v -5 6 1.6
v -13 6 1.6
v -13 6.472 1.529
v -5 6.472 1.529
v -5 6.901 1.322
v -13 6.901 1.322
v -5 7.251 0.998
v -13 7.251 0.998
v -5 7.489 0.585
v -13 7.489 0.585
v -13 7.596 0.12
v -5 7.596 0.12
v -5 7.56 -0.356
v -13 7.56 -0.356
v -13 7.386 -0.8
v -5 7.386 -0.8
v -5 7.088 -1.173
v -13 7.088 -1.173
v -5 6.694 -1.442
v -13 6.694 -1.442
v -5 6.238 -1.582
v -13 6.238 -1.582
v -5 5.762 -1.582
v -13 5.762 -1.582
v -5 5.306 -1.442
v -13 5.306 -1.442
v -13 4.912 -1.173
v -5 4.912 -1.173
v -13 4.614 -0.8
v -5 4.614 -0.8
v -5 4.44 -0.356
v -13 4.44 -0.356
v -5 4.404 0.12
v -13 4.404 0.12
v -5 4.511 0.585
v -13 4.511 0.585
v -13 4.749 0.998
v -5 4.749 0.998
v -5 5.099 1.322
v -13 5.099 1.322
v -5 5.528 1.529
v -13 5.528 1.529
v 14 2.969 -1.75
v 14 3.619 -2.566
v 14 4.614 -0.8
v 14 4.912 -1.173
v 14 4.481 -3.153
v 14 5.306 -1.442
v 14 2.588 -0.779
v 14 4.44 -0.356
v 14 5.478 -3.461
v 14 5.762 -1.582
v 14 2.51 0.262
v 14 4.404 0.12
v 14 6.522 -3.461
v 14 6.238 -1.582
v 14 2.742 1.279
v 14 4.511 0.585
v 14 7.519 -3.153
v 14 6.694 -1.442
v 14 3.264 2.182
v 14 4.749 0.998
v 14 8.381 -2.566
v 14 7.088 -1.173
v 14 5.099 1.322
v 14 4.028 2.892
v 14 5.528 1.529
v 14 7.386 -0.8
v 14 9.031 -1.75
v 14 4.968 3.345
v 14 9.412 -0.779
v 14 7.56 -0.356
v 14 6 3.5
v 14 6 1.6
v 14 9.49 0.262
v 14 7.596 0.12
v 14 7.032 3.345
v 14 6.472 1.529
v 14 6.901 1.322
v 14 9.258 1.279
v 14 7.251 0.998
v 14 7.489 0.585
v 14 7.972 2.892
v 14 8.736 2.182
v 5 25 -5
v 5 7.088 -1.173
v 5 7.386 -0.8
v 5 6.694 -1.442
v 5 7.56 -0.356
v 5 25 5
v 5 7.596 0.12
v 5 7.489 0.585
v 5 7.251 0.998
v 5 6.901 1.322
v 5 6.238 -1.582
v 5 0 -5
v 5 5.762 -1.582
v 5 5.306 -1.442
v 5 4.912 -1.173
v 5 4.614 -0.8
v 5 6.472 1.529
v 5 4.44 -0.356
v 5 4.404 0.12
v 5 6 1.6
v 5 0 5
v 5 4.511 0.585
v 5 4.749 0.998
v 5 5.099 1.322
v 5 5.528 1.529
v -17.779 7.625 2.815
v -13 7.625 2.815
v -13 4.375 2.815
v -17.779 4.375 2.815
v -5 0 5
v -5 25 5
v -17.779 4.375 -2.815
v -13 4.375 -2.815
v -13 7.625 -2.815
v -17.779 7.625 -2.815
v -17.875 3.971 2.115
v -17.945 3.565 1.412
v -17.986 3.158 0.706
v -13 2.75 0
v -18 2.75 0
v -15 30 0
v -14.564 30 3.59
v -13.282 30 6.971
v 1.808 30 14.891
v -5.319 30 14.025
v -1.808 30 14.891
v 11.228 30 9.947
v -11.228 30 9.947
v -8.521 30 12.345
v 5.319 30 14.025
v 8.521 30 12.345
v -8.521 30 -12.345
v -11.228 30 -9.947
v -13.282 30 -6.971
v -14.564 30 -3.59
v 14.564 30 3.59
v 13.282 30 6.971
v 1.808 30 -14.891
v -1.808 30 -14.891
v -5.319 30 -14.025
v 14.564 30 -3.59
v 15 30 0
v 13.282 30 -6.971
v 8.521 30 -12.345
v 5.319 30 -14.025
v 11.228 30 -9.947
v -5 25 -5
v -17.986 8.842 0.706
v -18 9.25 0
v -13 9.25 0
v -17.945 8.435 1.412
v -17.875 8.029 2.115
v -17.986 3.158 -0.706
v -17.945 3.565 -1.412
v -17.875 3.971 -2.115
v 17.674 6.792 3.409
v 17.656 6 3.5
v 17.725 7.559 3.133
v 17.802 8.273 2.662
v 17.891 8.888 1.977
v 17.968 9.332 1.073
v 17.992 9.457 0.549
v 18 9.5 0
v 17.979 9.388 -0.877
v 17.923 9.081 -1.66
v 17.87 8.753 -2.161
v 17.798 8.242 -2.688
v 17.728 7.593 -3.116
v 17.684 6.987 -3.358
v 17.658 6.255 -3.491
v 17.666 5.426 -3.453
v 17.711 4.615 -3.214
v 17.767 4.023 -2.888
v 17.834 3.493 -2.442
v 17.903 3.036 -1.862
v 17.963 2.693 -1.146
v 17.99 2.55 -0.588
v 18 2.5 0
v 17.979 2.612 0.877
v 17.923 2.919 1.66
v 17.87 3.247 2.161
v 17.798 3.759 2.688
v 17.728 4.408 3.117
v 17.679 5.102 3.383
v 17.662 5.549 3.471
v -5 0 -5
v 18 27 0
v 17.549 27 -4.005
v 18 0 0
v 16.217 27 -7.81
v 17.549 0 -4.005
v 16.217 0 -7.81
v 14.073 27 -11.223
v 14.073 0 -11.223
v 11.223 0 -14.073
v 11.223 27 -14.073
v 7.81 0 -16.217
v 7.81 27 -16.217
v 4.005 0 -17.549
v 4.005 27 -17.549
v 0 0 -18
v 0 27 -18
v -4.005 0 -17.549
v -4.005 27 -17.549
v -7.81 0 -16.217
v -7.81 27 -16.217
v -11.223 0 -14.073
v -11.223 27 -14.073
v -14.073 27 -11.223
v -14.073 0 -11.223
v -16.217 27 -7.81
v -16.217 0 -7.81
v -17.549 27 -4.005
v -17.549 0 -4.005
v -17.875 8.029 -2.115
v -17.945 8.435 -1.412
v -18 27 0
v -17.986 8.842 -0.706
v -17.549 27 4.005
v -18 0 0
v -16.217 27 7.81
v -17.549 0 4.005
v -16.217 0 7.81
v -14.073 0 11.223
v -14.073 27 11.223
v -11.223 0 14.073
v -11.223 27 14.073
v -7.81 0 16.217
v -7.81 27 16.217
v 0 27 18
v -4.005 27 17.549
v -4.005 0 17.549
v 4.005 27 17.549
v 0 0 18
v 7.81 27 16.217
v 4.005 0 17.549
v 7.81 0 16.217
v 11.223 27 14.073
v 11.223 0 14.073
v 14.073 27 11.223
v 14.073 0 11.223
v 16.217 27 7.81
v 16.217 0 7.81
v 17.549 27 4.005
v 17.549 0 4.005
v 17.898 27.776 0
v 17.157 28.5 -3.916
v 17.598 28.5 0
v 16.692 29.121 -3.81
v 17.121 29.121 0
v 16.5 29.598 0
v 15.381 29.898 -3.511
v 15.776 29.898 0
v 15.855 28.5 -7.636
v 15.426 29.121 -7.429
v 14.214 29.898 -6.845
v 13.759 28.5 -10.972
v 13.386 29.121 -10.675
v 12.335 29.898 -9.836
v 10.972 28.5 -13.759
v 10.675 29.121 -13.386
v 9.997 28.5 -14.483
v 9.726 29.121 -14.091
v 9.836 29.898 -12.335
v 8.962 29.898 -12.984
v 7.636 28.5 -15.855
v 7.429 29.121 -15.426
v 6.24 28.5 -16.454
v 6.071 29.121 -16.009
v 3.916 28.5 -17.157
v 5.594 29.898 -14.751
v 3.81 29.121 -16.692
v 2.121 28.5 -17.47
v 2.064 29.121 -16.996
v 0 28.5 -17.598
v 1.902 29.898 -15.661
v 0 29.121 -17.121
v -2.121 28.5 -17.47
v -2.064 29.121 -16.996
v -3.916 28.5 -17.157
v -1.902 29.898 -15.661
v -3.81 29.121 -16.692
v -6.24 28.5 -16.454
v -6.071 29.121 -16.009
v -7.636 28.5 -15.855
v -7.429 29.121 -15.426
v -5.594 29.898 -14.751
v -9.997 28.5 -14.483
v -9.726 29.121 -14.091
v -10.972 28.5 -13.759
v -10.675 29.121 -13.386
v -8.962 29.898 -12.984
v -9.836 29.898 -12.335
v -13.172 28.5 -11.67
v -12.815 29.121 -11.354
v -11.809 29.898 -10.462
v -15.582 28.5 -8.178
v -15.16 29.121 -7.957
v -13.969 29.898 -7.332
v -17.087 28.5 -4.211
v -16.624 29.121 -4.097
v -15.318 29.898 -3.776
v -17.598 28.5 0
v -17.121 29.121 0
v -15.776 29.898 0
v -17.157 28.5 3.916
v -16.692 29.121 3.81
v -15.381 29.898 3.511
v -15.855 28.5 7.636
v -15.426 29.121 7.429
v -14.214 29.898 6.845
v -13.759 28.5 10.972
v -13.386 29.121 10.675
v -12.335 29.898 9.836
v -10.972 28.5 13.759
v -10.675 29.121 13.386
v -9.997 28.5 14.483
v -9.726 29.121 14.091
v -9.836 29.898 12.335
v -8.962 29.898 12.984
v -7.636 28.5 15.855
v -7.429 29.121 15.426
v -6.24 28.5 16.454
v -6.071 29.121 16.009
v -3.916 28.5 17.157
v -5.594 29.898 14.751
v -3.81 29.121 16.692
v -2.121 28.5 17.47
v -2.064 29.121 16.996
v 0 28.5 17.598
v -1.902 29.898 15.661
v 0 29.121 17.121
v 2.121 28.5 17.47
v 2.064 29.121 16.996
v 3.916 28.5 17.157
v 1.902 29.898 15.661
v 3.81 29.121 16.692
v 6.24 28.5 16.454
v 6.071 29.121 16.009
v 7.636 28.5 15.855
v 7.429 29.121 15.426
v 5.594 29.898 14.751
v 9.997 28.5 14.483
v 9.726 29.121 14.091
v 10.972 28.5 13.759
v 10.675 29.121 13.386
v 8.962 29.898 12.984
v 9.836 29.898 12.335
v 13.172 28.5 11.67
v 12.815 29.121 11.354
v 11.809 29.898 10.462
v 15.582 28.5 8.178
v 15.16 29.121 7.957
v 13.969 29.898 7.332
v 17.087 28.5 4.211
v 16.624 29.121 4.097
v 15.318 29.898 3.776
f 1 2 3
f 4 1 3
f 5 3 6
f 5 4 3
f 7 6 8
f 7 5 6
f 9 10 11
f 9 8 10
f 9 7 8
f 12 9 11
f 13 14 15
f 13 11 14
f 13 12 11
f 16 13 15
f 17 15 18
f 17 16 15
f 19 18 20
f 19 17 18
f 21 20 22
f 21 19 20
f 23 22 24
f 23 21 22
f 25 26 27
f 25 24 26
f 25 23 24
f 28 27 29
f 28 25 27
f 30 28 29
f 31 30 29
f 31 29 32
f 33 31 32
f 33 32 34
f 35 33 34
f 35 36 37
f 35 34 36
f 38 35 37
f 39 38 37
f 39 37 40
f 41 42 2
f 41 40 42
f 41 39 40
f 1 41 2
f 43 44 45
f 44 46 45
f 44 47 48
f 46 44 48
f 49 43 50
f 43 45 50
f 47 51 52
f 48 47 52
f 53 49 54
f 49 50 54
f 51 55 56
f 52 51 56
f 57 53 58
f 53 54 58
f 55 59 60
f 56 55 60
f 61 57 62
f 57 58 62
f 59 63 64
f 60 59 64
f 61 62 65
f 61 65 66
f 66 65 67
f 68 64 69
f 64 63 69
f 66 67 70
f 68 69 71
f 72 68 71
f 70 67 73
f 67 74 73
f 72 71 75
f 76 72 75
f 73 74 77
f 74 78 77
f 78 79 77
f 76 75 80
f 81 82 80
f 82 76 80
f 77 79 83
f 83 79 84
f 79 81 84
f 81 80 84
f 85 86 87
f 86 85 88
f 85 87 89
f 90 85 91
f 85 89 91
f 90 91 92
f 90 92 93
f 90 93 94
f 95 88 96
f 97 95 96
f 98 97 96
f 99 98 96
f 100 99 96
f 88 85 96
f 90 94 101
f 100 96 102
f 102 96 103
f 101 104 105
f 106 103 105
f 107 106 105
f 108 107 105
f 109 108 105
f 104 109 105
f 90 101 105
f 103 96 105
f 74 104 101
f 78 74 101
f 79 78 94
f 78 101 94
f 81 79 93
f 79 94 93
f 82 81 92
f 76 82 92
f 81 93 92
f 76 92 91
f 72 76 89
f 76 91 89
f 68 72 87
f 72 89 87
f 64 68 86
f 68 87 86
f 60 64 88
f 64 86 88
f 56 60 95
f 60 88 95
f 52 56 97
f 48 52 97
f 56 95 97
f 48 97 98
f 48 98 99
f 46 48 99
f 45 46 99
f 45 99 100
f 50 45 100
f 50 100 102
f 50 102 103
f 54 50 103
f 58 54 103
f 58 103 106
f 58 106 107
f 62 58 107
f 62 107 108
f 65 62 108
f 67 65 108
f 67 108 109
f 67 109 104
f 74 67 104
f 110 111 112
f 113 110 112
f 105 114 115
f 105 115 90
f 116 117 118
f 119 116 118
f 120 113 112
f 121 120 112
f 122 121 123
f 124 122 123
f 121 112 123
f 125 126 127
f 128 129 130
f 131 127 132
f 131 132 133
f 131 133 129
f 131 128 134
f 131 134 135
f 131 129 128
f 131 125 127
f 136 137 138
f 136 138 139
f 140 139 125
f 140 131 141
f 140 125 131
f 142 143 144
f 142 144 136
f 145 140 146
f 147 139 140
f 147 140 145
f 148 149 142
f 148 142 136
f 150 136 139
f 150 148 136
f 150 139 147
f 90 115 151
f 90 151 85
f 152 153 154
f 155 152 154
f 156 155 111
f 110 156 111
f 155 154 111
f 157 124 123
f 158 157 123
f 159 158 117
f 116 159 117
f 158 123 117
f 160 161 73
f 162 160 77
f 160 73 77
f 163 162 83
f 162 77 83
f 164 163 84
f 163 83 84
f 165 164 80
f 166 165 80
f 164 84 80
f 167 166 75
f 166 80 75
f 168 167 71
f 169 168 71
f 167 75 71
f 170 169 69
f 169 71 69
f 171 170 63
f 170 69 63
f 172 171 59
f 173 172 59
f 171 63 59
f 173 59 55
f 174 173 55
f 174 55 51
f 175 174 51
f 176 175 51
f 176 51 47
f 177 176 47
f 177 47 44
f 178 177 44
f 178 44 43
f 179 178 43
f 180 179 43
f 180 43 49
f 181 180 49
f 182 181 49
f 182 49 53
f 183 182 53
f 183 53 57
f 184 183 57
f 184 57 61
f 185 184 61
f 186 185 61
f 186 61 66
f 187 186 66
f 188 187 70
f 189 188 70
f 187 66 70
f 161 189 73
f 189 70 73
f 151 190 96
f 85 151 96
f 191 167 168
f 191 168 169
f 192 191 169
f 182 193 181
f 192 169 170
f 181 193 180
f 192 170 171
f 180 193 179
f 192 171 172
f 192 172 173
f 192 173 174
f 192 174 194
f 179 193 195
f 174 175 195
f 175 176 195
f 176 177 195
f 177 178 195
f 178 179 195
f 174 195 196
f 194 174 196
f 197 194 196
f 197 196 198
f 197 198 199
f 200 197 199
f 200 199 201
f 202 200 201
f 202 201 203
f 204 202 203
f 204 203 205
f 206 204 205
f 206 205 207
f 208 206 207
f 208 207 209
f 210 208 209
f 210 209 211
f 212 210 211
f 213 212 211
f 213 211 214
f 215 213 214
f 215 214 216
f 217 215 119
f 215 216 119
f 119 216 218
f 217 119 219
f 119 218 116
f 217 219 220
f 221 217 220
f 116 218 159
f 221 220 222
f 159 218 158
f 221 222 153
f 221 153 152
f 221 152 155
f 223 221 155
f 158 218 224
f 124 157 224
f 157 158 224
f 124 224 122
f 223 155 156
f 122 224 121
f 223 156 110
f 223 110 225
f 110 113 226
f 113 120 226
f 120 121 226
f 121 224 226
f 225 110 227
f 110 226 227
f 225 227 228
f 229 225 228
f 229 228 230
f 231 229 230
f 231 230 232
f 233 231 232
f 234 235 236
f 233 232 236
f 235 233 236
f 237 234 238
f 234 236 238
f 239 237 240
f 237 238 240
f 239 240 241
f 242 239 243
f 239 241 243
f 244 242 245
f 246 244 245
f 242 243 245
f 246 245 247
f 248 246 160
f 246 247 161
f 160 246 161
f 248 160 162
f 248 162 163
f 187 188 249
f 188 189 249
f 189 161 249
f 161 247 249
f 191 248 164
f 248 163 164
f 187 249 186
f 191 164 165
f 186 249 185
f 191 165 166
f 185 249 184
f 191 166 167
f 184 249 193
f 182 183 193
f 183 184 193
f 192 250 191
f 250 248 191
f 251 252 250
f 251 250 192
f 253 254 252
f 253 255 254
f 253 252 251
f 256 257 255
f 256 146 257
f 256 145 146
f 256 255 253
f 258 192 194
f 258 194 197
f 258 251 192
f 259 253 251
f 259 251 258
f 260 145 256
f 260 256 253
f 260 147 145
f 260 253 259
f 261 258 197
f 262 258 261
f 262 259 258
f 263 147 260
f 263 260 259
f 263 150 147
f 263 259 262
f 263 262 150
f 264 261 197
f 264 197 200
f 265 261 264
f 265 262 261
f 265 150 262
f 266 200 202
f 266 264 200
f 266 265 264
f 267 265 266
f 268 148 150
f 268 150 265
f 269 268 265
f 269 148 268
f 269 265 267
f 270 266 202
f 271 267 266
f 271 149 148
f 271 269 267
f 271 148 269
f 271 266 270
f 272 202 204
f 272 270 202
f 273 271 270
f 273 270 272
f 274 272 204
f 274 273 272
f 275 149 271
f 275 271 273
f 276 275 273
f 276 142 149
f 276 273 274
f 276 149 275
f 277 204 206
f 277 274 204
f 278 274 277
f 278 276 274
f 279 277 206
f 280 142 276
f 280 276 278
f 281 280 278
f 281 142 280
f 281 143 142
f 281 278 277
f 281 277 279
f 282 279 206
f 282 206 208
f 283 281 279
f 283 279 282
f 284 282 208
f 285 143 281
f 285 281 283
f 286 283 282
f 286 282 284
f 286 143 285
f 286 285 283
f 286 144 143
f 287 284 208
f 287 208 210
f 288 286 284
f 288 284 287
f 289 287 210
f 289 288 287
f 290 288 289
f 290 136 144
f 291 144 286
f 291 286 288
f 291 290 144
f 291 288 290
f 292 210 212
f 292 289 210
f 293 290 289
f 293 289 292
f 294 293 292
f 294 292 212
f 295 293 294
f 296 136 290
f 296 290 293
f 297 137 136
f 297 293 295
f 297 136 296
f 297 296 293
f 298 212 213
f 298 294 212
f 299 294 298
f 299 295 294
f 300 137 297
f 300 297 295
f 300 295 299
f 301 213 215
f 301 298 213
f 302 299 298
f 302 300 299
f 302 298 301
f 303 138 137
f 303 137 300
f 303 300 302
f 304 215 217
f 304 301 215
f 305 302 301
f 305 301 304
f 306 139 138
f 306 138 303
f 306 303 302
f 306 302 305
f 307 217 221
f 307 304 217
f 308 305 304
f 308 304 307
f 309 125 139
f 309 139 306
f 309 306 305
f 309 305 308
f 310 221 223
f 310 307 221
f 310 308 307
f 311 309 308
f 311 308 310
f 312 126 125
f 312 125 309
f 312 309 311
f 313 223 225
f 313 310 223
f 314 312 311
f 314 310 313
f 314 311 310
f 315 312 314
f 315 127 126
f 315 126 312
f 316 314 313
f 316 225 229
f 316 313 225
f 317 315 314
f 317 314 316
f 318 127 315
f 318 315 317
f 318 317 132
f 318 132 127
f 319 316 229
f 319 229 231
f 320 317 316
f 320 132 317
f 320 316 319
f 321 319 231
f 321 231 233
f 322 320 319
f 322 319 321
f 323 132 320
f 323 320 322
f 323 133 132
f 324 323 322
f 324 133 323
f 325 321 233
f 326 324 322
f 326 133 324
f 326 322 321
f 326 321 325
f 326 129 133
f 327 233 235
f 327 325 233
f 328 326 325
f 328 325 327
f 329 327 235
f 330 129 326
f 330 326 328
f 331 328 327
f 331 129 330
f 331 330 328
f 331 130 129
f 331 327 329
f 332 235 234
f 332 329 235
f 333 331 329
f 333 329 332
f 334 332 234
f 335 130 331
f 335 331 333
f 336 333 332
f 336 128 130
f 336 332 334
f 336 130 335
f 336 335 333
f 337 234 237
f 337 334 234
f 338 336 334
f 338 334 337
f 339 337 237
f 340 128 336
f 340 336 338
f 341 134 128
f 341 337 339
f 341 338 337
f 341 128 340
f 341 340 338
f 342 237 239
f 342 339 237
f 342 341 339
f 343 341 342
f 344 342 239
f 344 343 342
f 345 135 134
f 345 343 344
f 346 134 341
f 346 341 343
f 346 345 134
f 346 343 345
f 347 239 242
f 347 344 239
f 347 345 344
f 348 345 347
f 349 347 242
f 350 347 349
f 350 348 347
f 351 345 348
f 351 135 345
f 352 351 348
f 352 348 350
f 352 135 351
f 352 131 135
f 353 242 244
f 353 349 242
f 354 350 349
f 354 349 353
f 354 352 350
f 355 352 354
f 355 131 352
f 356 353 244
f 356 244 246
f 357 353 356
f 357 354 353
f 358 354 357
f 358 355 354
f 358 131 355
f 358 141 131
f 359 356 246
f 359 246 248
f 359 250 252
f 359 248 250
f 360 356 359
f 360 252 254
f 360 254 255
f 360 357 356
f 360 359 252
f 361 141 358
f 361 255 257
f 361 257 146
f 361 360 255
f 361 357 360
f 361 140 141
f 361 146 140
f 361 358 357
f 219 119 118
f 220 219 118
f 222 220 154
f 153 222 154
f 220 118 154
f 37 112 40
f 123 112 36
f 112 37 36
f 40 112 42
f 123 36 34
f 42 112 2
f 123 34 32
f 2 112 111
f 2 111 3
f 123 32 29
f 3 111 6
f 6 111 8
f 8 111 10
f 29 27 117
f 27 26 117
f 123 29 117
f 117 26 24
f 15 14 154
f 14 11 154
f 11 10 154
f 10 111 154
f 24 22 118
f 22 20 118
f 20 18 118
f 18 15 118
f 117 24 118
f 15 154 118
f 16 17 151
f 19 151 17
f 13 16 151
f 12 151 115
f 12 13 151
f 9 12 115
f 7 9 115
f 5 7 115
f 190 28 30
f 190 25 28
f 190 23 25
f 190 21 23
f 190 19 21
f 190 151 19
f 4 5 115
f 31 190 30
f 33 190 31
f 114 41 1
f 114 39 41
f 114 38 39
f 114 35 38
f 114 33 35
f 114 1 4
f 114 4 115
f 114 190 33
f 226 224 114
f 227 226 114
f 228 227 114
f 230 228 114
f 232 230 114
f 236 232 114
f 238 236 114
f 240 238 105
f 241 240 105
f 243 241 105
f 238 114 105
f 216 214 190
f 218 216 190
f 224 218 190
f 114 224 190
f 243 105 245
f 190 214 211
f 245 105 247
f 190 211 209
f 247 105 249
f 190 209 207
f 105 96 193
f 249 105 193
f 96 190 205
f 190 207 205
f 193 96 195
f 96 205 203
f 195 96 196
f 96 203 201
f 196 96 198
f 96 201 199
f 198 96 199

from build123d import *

# Parameters (mm, degrees)
SKETCH1_R               = 18
BOSS_EXTRUDE1_DEPTH     = 30
FILLET1_R               = 3
SKETCH2_W               = 10
SKETCH2_H               = 10
CUT_EXTRUDE1_DEPTH      = 25
SKETCH3_R               = 1.6
CUT_EXTRUDE2_DEPTH      = 24
CUT_EXTRUDE2_DEPTH_BACK = 14.0000001
CUT_EXTRUDE3_START      = -9
SKETCH4_R               = 3.5
CUT_EXTRUDE3_DEPTH      = 20
CUT_EXTRUDE4_START      = -8
CUT_EXTRUDE4_DEPTH      = 16


with BuildPart() as part:
    # Sketch1 → Boss-Extrude1 (new body)
    with BuildSketch(Plane(origin=(0, 0, 0), x_dir=(1, 0, 0), z_dir=(0, 1, 0))):
        Circle(SKETCH1_R)
    extrude(amount=BOSS_EXTRUDE1_DEPTH)

    # Fillet1
    fillet1_edges = [part.edges().sort_by_distance(p)[0] for p in [
        (-18, 30, 0),
    ]]
    fillet(fillet1_edges, radius=FILLET1_R)

    # Sketch2 → Cut-Extrude1 (cut)
    with BuildSketch(Plane.XZ):
        Rectangle(SKETCH2_W, SKETCH2_H)
    extrude(amount=-CUT_EXTRUDE1_DEPTH, mode=Mode.SUBTRACT)

    # Sketch3 → Cut-Extrude2 (cut, two sides)
    with BuildSketch(Plane.ZY.offset(-5)) as cut_extrude2_sk:
        with Locations((0, 6)):
            Circle(SKETCH3_R)
    extrude(amount=CUT_EXTRUDE2_DEPTH, mode=Mode.SUBTRACT)
    extrude(cut_extrude2_sk.sketch, amount=-CUT_EXTRUDE2_DEPTH_BACK, mode=Mode.SUBTRACT)

    # Sketch4 → Cut-Extrude3 (cut)
    with BuildSketch(Plane.ZY.offset(-5).offset(CUT_EXTRUDE3_START)):
        with Locations((0, 6)):
            Circle(SKETCH4_R)
    extrude(amount=-CUT_EXTRUDE3_DEPTH, mode=Mode.SUBTRACT)

    # Sketch5 → Cut-Extrude4 (cut)
    with BuildSketch(Plane(origin=(-5, 0, 0), x_dir=(0, 0, -1), z_dir=(1, 0, 0)).offset(CUT_EXTRUDE4_START)):
        Polygon((-2.814582562, 7.625), (-2.814582562, 4.375), (0, 2.75), (2.814582562, 4.375), (2.814582562, 7.625), (0, 9.25), align=None)
    extrude(amount=-CUT_EXTRUDE4_DEPTH, mode=Mode.SUBTRACT)


solid = part.part
